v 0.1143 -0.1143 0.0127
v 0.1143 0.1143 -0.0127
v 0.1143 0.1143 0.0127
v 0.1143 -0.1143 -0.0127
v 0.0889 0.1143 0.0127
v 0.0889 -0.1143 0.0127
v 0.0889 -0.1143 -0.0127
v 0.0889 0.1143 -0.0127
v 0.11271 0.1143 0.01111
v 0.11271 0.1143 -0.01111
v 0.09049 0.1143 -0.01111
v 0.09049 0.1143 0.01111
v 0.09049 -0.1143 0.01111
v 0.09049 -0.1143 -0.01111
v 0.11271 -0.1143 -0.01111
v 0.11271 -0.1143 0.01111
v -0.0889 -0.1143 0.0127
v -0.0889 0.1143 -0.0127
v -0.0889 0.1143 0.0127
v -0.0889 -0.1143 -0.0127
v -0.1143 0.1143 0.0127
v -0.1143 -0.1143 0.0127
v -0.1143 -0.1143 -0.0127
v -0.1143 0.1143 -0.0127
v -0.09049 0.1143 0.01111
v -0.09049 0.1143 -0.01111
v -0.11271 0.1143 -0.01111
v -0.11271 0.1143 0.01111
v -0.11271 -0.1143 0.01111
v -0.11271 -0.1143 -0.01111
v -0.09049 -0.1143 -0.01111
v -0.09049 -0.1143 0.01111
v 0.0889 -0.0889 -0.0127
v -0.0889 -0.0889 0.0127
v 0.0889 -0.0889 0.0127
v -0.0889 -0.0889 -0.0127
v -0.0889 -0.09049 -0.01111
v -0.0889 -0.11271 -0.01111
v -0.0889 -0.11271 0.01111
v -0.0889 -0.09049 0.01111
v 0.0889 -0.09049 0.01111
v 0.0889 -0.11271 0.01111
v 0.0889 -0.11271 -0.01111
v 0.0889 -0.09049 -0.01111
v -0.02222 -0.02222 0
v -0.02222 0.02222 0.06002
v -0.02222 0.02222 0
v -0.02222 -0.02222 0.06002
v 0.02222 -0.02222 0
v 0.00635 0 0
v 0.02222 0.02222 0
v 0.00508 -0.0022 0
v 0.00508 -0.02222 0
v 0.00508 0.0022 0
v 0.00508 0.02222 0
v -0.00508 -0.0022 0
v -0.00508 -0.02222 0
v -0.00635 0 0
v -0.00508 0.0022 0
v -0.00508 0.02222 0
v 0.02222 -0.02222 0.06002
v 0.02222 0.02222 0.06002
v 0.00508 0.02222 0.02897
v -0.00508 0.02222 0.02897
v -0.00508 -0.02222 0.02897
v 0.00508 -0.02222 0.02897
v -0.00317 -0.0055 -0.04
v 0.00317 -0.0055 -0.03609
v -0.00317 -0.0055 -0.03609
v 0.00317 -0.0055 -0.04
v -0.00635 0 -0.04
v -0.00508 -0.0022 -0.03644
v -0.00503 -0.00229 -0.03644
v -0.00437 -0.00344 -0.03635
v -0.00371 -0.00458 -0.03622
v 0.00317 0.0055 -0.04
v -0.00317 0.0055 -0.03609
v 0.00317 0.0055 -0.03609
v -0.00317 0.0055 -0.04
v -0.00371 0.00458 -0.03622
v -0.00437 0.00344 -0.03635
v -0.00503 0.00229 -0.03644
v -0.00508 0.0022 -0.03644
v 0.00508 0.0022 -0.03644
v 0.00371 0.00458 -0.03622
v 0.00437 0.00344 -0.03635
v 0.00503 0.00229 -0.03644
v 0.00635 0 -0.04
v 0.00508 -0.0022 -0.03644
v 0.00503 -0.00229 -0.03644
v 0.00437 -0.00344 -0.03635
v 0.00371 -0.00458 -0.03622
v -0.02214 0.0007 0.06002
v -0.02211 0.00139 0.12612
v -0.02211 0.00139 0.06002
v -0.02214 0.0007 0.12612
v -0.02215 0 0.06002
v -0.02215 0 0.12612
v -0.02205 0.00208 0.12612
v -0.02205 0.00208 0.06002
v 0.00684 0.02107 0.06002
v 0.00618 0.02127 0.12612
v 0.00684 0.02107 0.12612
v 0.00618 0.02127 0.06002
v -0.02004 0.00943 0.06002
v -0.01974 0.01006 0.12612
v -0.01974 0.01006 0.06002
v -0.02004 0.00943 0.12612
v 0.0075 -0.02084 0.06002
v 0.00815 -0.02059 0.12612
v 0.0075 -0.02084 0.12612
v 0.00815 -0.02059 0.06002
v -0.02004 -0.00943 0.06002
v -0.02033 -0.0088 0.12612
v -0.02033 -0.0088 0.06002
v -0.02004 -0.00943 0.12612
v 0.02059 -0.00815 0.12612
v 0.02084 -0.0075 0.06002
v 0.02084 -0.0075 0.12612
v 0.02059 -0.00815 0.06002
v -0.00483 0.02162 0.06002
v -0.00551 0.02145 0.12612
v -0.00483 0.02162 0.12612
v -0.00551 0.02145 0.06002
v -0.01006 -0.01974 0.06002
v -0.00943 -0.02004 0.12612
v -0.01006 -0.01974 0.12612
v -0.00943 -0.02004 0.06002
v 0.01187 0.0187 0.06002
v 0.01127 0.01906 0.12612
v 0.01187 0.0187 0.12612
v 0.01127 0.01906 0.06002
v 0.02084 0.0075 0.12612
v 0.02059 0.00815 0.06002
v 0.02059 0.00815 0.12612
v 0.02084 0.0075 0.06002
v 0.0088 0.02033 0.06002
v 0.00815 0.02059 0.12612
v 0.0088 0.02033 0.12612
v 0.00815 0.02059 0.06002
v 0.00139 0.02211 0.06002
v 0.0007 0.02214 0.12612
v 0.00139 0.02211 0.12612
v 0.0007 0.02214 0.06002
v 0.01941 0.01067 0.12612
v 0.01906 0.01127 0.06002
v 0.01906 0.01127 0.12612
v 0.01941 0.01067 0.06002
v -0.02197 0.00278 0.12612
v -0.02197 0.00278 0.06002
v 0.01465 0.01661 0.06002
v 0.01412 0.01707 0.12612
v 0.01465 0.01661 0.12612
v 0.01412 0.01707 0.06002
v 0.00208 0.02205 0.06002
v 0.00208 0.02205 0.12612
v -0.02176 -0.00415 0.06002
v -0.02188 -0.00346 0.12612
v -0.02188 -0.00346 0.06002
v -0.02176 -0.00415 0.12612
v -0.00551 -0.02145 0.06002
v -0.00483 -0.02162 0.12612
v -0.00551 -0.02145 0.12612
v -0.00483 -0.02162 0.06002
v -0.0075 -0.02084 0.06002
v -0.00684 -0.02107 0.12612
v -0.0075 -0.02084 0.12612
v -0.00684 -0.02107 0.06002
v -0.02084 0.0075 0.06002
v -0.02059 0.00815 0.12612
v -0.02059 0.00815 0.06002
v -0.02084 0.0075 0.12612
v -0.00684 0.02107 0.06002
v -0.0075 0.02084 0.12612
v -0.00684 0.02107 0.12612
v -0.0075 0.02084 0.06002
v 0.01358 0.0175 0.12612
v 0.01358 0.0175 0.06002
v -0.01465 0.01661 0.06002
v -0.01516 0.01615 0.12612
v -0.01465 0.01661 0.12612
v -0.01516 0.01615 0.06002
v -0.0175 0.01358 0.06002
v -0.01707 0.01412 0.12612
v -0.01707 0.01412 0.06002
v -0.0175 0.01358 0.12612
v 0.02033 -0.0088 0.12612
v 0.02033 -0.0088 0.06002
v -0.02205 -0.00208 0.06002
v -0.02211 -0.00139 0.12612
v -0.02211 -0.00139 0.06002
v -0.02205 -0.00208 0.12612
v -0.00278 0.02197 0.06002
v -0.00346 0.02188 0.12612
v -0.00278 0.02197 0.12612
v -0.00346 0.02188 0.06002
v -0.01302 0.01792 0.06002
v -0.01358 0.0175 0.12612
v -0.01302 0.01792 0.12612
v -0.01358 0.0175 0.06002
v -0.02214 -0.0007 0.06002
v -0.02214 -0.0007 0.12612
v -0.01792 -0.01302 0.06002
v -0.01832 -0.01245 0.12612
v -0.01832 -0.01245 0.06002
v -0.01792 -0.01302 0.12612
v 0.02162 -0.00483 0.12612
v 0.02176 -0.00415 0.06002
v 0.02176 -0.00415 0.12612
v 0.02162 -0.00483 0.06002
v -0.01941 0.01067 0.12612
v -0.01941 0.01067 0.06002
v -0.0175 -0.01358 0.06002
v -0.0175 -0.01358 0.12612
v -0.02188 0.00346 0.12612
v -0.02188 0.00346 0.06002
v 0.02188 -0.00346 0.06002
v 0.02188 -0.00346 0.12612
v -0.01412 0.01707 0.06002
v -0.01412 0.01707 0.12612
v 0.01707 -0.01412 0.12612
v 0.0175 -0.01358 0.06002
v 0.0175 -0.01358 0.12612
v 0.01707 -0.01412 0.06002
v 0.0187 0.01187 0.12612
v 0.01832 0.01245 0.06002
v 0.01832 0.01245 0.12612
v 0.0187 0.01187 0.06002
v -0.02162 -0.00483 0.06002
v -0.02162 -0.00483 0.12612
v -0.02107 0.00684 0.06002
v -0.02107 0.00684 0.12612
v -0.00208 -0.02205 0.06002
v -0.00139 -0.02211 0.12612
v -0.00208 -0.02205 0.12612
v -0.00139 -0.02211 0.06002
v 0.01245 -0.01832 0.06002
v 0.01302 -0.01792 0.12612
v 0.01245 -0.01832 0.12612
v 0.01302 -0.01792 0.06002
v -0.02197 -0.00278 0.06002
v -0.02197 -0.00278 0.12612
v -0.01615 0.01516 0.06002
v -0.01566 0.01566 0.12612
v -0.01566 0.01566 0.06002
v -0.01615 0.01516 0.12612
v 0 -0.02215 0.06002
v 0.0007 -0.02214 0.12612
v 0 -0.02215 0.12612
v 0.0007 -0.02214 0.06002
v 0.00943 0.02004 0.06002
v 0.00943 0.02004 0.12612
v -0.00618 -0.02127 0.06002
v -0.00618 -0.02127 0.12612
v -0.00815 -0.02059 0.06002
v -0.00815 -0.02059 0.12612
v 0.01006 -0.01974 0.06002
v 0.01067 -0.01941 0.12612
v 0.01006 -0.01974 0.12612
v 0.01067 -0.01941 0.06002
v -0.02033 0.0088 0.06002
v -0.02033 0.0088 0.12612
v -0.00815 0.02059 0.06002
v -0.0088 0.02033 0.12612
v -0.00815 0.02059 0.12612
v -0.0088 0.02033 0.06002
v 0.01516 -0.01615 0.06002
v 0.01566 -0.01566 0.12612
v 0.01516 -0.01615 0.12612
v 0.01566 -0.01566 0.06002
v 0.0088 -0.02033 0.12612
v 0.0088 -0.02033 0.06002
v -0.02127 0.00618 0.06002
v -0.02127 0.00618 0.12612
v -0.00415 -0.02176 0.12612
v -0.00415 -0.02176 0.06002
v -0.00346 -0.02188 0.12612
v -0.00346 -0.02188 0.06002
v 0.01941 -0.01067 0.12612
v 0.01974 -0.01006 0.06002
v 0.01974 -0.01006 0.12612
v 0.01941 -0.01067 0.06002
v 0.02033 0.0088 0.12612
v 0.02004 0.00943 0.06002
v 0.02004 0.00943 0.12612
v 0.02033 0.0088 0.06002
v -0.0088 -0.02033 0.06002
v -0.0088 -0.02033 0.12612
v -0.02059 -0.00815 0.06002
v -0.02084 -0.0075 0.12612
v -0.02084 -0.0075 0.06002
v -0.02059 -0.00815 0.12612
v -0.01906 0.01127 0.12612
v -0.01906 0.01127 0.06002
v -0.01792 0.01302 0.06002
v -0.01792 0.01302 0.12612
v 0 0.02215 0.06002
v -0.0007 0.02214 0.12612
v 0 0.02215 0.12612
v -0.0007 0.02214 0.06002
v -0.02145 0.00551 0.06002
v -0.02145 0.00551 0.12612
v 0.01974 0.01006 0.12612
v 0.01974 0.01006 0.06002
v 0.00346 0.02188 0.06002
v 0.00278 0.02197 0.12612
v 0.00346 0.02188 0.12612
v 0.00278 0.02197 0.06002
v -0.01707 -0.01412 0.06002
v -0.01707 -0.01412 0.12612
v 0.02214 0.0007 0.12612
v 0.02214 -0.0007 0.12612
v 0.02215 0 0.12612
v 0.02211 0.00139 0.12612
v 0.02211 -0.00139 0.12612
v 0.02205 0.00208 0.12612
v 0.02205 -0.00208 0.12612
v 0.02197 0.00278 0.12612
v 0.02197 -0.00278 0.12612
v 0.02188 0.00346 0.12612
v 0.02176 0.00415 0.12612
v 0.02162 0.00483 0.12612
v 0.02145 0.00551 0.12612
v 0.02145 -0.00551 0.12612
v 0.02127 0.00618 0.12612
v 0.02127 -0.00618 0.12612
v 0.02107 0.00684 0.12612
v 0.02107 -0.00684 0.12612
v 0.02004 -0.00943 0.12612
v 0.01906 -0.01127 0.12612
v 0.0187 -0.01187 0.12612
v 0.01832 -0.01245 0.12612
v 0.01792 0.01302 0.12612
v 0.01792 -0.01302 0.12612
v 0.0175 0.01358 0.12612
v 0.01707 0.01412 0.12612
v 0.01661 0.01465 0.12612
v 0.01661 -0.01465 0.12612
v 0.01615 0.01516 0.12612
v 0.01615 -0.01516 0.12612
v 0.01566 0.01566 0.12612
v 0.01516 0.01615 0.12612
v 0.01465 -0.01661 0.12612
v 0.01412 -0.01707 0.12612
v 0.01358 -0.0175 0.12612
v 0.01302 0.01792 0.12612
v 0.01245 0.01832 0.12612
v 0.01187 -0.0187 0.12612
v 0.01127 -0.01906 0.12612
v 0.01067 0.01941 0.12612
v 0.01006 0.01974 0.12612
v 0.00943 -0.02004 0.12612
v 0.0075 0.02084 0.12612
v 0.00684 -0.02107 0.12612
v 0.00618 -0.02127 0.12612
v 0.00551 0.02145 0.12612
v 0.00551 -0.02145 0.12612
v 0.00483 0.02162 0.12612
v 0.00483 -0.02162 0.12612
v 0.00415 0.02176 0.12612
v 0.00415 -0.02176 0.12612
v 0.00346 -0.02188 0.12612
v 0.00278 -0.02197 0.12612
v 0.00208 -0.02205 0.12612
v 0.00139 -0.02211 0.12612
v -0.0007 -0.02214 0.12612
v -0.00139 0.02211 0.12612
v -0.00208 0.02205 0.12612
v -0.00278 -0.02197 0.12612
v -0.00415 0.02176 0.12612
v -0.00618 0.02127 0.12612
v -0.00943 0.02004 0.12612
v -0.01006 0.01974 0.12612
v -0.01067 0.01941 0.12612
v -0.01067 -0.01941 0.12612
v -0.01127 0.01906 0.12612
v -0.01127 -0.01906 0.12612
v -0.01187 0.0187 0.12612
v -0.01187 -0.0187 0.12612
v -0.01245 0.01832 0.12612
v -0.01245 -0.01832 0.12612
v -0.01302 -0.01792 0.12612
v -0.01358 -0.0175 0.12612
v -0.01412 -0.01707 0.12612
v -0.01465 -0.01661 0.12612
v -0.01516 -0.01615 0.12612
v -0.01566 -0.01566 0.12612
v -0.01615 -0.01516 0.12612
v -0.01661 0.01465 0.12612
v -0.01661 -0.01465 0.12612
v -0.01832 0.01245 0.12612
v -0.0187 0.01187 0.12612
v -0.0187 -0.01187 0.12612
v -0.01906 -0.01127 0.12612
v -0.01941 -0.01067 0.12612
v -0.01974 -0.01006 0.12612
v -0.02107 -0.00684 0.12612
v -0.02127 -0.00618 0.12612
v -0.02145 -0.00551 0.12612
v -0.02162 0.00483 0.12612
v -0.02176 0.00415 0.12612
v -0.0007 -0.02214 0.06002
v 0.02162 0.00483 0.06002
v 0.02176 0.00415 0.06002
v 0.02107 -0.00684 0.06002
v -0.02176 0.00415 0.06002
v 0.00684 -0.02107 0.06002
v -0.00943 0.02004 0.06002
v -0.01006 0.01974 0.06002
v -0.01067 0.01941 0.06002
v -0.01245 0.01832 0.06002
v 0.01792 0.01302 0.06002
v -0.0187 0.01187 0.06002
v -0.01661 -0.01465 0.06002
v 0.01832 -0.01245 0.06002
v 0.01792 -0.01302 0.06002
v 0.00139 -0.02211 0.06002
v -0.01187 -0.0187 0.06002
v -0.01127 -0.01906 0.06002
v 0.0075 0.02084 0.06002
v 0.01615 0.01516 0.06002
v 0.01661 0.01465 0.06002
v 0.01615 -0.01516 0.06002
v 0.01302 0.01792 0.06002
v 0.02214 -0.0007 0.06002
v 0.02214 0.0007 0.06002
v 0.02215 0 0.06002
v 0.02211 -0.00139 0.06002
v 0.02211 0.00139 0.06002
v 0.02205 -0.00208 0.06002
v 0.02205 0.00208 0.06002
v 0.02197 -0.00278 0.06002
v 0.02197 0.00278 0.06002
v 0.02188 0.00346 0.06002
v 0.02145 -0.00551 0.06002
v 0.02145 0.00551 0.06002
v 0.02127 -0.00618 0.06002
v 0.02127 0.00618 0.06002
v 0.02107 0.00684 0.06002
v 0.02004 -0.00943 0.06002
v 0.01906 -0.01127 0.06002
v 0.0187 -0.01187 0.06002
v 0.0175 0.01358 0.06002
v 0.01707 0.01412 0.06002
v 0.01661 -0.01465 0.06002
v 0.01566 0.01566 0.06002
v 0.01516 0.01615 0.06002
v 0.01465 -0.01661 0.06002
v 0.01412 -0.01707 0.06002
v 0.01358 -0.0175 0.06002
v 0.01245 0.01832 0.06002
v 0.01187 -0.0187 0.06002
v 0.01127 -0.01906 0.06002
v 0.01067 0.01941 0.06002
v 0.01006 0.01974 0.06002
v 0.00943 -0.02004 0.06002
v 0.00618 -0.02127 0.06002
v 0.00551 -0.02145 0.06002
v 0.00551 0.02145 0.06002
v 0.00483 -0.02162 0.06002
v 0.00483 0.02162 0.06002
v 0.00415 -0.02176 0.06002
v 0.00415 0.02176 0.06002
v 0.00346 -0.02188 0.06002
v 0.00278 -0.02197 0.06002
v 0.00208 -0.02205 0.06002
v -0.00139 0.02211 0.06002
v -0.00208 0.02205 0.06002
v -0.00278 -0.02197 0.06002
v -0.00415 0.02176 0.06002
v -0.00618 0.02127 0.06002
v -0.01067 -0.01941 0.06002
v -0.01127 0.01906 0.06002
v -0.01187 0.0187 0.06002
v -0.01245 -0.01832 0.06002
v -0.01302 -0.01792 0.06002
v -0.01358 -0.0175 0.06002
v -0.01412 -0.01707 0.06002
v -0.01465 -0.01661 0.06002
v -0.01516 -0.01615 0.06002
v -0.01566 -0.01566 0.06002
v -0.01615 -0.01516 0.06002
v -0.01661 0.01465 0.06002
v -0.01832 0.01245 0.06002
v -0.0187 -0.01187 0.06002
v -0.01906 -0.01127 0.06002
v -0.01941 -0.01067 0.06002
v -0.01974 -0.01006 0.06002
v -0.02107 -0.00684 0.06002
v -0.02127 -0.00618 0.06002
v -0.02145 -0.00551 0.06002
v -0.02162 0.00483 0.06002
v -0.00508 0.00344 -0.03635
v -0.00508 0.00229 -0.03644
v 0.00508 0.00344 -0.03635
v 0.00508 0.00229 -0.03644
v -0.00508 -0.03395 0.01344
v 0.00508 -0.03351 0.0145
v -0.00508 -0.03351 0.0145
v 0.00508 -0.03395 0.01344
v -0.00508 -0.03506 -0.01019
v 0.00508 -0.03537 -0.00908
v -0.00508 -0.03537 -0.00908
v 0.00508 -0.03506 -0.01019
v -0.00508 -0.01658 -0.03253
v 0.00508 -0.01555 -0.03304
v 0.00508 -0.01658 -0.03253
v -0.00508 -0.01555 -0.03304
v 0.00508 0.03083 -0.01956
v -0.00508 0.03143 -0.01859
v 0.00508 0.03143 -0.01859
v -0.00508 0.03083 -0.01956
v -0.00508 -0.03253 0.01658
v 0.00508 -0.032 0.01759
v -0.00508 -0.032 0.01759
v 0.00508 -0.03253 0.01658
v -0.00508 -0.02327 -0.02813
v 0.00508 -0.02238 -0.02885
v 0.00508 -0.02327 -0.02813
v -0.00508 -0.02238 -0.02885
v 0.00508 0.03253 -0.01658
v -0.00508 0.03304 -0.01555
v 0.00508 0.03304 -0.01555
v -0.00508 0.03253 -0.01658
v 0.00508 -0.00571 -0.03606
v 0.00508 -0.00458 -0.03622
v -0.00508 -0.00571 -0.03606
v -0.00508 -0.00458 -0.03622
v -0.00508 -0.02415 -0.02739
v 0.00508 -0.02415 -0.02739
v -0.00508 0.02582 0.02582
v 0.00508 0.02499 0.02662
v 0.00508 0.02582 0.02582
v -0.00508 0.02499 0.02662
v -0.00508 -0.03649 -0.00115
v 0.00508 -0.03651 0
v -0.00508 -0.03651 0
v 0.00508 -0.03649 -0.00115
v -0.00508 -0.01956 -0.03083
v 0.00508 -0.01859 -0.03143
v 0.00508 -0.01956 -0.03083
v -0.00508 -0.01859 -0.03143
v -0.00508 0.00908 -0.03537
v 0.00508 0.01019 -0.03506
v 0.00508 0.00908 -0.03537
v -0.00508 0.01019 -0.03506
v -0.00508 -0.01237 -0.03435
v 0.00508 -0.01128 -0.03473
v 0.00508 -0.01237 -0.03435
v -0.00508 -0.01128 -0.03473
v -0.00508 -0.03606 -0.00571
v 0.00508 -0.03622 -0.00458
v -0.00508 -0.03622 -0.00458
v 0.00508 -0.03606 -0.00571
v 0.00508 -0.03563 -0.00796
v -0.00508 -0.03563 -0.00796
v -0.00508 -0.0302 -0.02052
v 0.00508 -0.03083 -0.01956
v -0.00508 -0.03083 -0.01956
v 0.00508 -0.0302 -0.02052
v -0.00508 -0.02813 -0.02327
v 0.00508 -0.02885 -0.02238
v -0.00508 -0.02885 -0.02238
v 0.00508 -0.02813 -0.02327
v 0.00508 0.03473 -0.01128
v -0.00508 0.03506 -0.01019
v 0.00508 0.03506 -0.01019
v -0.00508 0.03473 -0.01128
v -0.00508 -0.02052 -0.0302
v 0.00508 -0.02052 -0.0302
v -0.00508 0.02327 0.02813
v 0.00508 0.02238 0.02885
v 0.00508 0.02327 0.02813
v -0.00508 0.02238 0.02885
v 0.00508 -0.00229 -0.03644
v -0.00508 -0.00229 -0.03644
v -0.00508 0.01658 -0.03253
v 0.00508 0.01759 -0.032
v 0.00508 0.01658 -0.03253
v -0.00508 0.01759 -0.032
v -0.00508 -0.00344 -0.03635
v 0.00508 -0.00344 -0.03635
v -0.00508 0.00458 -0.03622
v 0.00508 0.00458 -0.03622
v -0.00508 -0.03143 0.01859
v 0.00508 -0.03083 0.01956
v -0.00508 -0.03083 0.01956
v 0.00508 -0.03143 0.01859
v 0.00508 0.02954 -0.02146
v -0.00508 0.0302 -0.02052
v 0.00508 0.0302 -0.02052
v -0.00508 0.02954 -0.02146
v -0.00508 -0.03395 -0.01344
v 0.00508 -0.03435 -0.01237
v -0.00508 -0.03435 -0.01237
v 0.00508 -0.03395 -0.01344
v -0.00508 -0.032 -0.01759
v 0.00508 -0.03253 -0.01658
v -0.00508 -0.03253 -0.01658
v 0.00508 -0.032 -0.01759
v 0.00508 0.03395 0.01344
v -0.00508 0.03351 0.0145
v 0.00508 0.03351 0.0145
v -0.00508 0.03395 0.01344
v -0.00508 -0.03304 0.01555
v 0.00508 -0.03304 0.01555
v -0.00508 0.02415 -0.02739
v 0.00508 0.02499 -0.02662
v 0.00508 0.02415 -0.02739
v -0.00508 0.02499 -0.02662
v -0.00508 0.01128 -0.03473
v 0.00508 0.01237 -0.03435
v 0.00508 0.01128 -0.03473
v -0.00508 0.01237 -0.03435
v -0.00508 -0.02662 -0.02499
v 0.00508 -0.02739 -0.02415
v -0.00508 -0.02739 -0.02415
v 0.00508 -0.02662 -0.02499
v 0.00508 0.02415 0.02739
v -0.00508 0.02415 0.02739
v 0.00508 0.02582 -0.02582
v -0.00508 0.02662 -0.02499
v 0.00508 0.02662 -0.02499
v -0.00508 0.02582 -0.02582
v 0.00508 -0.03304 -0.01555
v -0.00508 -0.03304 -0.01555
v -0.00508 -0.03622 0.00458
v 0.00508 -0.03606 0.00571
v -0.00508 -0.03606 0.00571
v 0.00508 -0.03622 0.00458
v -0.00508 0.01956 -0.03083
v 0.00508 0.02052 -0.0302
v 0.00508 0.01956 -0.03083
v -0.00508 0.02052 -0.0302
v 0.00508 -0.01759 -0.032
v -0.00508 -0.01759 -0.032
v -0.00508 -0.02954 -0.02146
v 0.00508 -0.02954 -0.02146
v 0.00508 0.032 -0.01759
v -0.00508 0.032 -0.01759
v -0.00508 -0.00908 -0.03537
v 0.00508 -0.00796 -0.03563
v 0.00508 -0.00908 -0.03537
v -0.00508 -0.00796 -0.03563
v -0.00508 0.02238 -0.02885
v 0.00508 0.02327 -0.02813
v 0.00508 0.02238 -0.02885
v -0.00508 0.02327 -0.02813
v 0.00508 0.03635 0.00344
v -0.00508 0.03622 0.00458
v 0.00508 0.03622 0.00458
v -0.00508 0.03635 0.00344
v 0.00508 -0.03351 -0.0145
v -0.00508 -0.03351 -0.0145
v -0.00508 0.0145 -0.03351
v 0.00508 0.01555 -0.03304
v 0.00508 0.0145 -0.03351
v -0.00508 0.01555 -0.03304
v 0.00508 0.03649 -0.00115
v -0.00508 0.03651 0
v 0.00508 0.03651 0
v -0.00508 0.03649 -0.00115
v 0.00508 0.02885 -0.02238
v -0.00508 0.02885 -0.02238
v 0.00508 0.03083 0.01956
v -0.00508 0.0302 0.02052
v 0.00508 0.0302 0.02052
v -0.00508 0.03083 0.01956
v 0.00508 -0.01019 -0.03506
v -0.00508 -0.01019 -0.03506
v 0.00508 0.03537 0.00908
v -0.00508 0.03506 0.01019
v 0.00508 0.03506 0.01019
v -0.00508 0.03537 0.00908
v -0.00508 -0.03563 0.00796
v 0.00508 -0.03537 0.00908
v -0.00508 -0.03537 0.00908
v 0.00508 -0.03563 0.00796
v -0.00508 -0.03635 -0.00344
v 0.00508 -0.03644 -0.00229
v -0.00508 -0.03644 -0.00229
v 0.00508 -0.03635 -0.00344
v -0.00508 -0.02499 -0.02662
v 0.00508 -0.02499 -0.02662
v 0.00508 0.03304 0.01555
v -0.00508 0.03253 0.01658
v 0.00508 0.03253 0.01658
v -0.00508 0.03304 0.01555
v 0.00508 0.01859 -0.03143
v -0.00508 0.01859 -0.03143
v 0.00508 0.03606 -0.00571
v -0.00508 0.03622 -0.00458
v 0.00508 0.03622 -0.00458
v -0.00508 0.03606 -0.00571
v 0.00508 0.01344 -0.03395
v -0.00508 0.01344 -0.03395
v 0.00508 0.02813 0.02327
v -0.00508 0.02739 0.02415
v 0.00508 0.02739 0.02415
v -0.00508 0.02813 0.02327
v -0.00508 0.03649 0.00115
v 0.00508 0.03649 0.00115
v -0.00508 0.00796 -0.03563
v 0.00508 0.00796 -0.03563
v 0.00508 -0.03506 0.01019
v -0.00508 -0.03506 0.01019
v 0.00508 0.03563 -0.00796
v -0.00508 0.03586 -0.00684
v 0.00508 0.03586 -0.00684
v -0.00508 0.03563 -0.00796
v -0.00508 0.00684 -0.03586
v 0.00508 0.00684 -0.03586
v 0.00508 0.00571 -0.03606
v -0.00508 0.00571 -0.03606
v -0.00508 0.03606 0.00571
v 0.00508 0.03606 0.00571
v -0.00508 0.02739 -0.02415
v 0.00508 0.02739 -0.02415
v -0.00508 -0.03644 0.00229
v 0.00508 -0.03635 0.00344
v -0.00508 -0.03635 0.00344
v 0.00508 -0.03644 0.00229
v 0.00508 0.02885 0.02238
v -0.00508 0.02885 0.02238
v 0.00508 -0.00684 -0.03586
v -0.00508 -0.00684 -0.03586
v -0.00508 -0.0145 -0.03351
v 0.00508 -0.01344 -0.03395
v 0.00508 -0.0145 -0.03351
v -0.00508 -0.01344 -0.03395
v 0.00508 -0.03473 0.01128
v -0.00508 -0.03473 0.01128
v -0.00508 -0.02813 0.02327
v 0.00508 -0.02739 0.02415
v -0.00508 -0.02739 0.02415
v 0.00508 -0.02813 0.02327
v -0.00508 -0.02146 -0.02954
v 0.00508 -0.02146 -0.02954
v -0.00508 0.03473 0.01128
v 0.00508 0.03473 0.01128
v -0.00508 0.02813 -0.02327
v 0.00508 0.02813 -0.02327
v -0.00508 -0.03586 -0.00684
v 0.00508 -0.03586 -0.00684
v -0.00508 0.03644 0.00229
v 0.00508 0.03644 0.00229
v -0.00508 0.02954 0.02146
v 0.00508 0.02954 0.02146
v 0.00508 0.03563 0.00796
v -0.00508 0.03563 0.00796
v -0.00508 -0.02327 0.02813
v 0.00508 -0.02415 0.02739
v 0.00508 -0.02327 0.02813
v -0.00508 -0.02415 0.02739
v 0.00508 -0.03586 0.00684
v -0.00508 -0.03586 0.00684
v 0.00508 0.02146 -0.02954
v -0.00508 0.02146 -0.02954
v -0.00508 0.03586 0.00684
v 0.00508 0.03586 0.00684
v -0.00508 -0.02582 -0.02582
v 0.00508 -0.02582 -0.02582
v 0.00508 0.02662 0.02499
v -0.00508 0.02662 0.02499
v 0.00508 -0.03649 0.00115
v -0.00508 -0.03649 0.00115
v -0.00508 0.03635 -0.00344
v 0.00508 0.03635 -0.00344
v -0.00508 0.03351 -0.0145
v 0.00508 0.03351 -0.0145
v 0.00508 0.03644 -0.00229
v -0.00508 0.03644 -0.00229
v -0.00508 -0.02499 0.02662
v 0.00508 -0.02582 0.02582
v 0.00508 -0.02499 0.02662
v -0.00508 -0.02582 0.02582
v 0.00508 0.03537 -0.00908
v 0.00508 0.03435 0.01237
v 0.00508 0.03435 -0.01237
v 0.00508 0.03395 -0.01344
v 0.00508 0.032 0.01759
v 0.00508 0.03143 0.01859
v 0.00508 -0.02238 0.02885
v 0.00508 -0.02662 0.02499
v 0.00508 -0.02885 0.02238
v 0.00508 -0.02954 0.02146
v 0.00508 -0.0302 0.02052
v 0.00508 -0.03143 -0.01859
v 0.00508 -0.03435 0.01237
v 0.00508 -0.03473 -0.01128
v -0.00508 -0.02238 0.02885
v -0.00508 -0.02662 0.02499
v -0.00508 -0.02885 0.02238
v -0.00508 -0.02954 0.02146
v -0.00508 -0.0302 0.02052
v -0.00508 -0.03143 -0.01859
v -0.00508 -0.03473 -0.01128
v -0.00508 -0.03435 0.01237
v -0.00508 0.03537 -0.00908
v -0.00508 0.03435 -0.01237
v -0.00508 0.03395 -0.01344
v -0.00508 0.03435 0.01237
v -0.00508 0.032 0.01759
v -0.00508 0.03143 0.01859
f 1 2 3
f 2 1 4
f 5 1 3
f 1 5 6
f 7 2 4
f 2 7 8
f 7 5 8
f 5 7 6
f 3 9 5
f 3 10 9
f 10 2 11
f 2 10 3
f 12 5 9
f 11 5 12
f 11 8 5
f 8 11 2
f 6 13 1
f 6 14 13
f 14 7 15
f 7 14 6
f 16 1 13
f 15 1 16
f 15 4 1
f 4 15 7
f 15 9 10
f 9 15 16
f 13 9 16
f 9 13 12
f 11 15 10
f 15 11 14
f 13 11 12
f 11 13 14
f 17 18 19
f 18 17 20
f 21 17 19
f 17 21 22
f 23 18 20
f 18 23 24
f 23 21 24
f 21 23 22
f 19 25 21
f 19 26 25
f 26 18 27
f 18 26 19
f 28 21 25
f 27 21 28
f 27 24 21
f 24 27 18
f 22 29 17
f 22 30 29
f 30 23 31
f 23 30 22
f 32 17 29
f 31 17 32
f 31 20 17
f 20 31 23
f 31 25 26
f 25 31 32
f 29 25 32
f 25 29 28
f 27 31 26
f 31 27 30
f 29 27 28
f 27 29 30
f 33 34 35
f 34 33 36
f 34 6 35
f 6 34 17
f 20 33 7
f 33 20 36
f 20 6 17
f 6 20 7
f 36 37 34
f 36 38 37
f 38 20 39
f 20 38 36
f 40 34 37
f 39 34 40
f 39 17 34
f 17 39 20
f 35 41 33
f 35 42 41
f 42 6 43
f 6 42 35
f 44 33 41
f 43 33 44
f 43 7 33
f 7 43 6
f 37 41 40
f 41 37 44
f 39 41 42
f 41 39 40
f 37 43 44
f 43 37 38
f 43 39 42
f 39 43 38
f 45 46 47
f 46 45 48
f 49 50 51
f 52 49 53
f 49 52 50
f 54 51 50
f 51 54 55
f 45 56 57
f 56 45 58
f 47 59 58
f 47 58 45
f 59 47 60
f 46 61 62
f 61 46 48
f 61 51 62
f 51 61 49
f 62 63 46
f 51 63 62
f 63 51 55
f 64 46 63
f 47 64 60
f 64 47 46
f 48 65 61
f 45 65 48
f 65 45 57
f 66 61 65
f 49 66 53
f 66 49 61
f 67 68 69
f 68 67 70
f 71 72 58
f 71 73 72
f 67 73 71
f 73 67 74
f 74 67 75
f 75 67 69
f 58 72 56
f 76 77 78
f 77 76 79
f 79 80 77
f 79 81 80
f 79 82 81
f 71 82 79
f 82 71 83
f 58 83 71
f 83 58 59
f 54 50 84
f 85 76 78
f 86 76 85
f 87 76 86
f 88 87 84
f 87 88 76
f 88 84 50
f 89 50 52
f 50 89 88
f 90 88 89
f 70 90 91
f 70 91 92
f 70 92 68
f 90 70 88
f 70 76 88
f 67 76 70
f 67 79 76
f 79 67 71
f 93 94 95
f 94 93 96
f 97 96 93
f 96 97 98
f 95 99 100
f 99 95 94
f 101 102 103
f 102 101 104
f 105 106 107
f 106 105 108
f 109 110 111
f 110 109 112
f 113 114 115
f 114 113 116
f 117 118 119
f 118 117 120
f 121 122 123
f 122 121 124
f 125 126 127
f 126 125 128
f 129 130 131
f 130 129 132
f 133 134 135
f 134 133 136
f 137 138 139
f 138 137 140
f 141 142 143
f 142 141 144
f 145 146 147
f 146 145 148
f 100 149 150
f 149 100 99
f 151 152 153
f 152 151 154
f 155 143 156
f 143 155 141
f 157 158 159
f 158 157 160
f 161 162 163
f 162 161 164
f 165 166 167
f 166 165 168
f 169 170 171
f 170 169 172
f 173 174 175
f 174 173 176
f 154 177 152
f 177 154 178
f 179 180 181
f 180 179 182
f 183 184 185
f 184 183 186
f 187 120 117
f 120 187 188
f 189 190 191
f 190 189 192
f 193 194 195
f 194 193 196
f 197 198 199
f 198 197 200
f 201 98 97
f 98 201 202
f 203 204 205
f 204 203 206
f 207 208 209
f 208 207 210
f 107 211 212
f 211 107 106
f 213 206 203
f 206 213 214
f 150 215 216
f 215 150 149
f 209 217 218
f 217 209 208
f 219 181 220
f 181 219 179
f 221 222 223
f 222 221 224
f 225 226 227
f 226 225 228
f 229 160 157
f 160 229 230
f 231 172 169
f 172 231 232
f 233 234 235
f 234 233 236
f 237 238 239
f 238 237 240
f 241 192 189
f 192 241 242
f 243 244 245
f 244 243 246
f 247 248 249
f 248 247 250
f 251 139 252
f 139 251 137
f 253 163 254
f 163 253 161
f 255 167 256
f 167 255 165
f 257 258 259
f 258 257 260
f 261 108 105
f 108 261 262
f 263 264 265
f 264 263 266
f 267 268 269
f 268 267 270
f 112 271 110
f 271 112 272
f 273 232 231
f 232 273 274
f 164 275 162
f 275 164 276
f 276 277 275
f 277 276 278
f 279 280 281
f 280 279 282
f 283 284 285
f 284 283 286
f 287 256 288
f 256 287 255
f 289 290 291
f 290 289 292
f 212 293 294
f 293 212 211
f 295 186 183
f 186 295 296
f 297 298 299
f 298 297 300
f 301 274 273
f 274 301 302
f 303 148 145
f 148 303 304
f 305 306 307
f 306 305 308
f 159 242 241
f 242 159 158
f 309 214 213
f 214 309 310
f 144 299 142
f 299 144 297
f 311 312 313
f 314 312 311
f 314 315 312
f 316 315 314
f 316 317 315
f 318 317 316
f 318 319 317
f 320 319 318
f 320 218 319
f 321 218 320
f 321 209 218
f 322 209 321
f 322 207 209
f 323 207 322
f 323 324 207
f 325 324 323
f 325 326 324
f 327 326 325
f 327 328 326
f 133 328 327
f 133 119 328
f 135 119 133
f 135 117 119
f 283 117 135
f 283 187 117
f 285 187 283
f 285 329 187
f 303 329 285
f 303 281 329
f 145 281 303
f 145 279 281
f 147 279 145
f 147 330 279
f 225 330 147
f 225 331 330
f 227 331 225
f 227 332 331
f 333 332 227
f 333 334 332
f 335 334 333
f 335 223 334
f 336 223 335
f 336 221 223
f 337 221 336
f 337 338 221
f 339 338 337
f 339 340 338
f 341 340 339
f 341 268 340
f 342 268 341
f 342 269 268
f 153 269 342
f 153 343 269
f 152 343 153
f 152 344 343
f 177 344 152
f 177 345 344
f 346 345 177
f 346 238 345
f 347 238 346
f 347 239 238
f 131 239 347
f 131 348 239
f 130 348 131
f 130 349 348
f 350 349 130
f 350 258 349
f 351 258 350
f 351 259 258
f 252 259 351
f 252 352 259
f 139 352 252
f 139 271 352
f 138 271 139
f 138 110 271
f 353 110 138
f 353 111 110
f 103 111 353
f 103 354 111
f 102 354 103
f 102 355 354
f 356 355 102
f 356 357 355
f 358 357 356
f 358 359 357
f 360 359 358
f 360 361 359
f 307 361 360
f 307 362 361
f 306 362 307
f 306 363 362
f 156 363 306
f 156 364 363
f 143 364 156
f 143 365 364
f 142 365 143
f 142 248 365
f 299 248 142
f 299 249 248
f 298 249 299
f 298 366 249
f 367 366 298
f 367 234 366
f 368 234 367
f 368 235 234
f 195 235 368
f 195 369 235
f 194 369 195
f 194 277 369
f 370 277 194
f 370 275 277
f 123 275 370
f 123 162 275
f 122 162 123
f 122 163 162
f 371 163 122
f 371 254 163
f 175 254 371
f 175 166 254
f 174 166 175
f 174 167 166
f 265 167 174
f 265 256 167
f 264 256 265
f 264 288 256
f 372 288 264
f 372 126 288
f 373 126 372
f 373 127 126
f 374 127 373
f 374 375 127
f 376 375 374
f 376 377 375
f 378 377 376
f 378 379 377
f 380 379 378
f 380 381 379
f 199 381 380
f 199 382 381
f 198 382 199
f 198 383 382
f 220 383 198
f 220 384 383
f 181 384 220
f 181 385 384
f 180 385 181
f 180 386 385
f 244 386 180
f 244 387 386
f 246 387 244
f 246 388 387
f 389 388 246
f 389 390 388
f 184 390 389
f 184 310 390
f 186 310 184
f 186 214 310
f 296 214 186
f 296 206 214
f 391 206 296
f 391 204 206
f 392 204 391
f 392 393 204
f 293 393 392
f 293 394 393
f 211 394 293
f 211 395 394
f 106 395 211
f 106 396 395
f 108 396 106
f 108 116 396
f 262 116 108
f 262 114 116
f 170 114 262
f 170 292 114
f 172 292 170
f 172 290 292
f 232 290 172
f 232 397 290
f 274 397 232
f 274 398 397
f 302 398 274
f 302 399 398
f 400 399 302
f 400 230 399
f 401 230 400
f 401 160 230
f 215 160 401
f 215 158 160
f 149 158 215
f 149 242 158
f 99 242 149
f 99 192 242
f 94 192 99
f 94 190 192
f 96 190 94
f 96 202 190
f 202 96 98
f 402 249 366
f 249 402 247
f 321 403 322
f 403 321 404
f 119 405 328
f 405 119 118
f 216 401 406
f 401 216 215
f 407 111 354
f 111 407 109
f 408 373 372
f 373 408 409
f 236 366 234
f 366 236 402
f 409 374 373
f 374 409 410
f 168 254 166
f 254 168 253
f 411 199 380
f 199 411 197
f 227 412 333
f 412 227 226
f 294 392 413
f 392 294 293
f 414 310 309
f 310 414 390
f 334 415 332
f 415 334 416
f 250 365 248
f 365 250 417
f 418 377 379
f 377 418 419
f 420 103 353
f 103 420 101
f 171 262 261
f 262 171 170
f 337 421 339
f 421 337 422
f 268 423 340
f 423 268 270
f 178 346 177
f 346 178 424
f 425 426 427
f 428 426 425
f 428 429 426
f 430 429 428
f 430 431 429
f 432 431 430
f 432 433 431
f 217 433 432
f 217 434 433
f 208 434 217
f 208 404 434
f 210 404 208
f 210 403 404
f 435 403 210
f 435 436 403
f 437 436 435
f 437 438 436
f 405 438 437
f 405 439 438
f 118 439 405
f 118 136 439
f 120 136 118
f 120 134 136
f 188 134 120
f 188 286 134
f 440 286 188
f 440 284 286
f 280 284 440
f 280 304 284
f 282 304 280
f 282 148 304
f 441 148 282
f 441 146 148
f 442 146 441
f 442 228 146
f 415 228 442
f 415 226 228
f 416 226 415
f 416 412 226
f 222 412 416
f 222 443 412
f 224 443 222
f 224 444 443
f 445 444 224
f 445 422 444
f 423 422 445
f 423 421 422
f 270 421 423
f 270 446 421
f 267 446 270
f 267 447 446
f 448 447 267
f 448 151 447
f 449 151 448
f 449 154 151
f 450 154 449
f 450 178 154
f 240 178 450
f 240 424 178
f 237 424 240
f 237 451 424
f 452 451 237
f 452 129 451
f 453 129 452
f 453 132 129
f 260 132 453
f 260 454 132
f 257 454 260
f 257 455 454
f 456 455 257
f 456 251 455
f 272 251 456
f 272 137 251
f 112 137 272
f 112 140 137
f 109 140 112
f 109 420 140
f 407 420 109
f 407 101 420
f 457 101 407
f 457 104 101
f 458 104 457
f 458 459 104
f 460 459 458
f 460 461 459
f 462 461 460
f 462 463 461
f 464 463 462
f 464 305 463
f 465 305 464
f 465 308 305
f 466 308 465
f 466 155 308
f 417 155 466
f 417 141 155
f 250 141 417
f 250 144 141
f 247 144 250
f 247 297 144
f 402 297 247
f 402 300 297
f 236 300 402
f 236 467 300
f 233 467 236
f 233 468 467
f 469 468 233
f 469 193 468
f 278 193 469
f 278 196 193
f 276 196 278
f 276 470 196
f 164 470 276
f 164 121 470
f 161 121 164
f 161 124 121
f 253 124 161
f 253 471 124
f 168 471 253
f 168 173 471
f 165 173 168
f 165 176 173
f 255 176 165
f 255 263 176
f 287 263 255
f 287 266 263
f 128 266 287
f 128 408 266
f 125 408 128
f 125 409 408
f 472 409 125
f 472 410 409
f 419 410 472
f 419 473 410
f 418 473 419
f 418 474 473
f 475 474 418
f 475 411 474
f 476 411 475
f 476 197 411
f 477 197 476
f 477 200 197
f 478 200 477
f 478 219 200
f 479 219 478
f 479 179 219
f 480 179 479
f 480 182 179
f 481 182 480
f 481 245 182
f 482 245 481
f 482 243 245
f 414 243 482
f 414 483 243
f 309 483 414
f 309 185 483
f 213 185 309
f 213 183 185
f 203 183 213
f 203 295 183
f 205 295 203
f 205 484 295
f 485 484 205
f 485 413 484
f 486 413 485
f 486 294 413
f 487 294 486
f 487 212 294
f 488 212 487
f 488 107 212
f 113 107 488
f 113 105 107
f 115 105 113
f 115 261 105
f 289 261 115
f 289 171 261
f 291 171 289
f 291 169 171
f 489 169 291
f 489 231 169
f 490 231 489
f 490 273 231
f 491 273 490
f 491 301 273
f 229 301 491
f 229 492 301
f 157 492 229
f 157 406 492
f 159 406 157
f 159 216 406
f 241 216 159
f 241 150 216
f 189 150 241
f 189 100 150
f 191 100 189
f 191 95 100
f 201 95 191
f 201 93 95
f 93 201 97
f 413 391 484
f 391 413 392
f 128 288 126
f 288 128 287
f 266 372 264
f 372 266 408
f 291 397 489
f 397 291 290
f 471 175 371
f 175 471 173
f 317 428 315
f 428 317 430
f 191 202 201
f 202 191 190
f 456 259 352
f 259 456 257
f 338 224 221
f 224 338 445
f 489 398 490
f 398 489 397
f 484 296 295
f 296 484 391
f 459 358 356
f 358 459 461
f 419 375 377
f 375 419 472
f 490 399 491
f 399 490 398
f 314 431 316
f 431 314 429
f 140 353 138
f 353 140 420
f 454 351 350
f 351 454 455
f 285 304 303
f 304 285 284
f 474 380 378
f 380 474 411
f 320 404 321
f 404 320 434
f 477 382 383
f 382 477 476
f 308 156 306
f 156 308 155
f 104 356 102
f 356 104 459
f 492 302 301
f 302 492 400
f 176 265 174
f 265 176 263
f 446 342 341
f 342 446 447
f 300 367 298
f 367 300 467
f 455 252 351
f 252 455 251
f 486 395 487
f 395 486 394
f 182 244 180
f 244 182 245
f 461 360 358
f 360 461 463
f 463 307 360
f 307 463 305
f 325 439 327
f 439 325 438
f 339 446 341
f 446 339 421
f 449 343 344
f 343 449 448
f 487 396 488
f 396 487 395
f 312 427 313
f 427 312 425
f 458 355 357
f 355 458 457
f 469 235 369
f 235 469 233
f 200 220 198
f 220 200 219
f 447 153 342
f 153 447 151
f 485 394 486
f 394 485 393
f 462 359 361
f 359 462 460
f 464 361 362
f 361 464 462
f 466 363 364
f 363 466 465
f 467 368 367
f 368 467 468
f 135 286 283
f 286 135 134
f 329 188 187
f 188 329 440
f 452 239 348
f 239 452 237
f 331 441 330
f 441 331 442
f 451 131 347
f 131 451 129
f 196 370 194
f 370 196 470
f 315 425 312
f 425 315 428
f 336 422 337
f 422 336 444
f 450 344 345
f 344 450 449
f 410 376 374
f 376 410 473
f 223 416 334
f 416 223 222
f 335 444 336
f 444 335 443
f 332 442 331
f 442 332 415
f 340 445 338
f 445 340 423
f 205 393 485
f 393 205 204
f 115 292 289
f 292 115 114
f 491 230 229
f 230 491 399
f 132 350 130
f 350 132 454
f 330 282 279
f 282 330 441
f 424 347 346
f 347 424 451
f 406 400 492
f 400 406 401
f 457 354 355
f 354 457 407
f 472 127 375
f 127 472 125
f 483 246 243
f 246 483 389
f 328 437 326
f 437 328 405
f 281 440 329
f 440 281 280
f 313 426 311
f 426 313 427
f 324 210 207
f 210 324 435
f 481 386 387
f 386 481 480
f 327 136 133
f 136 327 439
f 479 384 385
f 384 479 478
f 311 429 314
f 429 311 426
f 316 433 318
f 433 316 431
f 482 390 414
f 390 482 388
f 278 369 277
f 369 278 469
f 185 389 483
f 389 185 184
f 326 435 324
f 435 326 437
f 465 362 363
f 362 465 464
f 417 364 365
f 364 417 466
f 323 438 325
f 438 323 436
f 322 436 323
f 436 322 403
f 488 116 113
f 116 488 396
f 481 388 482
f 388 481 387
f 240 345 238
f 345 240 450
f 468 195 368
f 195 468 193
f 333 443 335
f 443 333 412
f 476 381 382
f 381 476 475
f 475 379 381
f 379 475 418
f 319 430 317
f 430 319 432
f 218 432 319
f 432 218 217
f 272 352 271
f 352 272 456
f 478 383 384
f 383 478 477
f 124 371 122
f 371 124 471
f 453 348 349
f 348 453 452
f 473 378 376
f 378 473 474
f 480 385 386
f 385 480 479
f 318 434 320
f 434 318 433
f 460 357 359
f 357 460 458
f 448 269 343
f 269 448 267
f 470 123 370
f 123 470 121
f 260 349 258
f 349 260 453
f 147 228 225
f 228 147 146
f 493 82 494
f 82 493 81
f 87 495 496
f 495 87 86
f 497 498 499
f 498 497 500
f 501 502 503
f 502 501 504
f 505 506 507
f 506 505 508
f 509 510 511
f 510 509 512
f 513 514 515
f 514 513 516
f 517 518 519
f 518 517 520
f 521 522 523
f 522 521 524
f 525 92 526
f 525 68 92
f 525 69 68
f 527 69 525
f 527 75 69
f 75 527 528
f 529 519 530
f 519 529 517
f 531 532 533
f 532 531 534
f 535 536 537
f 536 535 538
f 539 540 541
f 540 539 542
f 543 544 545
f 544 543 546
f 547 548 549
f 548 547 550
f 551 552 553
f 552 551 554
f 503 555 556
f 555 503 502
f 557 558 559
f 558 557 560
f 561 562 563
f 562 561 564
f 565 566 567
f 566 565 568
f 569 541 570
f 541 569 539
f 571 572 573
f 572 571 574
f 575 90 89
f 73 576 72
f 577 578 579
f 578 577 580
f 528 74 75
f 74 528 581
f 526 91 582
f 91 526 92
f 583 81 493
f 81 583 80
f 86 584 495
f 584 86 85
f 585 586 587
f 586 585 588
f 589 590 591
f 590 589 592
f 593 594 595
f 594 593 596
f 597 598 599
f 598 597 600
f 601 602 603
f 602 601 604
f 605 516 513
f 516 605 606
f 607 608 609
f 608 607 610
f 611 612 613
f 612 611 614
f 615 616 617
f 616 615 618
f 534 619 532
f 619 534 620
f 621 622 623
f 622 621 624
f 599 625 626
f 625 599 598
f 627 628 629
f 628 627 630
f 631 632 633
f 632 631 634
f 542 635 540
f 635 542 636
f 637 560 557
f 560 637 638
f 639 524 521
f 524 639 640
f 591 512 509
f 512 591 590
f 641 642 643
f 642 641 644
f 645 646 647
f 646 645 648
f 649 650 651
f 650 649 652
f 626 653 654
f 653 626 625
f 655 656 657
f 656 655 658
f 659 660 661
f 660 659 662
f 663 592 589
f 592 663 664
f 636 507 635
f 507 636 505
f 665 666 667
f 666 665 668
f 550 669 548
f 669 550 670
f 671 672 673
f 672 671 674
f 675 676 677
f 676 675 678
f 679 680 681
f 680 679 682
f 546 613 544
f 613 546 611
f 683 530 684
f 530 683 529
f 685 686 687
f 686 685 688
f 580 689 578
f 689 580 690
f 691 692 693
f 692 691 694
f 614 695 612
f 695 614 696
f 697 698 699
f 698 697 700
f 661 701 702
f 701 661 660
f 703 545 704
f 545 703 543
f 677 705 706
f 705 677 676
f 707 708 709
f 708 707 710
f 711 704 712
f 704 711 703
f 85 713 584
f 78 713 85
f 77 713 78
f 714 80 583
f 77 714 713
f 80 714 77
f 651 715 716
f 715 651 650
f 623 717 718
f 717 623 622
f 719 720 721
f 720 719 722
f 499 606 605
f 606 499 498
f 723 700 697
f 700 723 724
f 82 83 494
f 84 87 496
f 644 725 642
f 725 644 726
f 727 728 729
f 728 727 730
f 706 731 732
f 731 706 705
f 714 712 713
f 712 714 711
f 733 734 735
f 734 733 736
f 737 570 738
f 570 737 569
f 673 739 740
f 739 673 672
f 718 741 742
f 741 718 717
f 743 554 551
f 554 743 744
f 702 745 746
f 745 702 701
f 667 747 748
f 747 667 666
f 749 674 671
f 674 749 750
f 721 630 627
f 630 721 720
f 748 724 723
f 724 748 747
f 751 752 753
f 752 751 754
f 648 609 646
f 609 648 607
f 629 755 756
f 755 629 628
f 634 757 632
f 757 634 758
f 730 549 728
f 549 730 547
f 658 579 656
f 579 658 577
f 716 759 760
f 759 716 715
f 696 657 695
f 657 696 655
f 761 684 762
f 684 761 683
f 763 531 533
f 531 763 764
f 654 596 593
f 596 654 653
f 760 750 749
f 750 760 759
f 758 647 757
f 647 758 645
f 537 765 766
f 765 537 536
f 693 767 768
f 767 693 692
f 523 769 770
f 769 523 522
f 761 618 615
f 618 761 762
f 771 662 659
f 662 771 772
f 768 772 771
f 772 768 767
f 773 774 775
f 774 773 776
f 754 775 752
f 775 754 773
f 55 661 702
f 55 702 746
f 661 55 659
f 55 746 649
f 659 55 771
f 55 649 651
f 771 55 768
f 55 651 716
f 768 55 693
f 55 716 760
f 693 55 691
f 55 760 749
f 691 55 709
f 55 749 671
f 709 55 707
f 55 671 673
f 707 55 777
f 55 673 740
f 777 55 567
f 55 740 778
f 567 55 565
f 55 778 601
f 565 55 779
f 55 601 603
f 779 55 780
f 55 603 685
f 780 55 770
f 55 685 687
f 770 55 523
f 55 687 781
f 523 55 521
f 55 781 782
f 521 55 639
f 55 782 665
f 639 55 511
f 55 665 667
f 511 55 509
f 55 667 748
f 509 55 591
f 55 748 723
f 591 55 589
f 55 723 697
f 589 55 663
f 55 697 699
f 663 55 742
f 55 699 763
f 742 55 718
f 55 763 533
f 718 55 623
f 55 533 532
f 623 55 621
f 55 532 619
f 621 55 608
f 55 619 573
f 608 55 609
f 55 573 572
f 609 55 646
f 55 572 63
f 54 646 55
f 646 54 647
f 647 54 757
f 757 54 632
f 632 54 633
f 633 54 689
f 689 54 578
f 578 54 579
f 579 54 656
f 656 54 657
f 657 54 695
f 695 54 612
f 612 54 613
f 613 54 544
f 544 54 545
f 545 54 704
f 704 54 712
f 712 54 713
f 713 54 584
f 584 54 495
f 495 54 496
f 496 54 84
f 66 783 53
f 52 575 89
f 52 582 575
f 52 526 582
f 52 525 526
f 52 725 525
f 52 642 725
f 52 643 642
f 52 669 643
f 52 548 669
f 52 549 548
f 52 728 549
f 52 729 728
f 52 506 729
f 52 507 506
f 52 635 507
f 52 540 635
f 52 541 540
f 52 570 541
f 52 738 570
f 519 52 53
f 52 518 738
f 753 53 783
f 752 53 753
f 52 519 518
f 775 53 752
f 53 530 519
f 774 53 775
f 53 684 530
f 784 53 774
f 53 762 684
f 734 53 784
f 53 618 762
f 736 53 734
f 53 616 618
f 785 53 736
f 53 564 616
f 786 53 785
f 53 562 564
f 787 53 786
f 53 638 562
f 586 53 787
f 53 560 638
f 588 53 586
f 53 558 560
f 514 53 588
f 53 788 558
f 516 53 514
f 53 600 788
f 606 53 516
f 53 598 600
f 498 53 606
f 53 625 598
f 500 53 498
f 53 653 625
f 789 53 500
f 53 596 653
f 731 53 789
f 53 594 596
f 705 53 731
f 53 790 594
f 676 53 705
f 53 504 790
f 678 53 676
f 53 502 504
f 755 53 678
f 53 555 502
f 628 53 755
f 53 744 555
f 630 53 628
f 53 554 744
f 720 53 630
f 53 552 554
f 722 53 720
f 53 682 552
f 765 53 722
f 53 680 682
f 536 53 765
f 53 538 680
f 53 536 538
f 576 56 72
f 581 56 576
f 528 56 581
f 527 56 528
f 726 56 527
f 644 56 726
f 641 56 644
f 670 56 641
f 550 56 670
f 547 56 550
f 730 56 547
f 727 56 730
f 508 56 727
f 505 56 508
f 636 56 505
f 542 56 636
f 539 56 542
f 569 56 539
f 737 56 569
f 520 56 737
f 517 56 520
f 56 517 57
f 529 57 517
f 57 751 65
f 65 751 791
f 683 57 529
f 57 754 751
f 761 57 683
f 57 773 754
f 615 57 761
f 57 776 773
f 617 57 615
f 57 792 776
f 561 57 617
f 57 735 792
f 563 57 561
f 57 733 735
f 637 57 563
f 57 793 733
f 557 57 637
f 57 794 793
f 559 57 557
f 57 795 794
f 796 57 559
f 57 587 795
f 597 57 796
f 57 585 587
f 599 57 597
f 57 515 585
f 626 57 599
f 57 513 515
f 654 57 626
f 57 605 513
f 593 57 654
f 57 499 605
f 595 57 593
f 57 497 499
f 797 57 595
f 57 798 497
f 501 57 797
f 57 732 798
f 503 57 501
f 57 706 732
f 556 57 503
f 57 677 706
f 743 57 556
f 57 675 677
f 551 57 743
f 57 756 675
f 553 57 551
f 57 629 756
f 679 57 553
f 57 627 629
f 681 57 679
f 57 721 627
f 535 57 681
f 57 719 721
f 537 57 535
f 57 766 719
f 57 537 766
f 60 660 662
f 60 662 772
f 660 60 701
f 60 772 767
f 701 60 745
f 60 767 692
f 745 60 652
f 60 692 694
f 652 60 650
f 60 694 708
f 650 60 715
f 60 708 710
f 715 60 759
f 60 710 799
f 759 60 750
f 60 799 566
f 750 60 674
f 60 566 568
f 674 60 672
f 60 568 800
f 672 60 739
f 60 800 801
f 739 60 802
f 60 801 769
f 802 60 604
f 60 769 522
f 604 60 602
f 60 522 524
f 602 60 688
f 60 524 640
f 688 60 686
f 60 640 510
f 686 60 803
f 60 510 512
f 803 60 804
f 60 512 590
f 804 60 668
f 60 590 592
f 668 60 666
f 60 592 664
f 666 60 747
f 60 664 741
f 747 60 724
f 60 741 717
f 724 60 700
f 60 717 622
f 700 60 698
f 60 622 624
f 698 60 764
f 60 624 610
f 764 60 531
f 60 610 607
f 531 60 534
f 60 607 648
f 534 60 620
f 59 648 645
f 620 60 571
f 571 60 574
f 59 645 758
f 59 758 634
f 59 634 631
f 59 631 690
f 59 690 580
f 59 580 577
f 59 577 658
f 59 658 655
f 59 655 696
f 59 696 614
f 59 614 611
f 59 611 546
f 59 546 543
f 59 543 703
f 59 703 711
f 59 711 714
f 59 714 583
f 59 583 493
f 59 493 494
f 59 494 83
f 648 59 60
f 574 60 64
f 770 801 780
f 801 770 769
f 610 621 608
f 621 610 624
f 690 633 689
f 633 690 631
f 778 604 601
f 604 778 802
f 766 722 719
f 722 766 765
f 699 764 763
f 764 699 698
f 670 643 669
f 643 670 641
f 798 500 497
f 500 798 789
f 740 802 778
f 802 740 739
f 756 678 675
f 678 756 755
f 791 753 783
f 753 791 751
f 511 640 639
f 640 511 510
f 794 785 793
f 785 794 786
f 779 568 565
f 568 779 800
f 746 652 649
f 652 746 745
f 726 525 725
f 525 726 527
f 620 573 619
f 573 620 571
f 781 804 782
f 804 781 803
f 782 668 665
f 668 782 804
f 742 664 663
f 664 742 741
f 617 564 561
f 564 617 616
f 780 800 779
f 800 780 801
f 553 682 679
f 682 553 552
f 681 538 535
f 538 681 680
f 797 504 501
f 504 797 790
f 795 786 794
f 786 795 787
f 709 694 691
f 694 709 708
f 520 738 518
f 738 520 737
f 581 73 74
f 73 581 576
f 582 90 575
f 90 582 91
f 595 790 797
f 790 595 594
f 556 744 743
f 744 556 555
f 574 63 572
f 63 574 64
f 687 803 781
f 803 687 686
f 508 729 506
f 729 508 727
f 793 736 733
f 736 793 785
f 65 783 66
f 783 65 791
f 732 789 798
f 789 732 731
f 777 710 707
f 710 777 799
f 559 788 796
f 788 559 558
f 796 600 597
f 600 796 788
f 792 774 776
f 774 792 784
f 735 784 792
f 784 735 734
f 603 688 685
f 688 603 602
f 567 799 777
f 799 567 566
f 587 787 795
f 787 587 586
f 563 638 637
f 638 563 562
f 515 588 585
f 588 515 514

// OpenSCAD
$fn = 200;
module versa() {
    translate([0,0,66.1/2000+60.02/1000]){
    rotate([0,180,0]){
        cylinder(d=44.3/1000,h=66.1/1000,center=true,$fn=200);
        translate([0,0,60.02/2000+66.1/2000]){
            cube([44.45/1000,44.45/1000,60.02/1000],center=true);
            translate([0,0,40/2000+60.02/2000]){
                cylinder(r=0.0127/2,h=40/1000,$fn=6,center=true);
            }
        }
    }
    }
}
module wheel(){
    rotate([0,90,0]){
        cylinder(r=0.073025/2,h=0.01016,center=true);
    }
        //http://www.banebots.com/category/T40P-2875.html
}
module tube(sizeO, sizeI, l) {
    difference(){
        cube([sizeO,l,sizeO],center=true);
        cube([sizeI,l+0.1,sizeI],center=true);
    }
}
translate([0.2286/2-0.0254/2,0,0]){
    tube(0.0254,0.0254-0.003175,0.2286);
}
translate([-0.2286/2+0.0254/2,0,0]){
    tube(0.0254,0.0254-0.003175,0.2286);
}
translate([0,-0.2286/2+0.0254/2,0]){
    rotate([0,0,90]){
            tube(0.0254,0.0254-0.003175,0.2286-2*0.0254);
    }
}
*translate([0,0,0.5+0.2794-0.0254]){
    cube([1,1,1],center=true);
}
versa();
translate([0.254]){
wheel();
}
